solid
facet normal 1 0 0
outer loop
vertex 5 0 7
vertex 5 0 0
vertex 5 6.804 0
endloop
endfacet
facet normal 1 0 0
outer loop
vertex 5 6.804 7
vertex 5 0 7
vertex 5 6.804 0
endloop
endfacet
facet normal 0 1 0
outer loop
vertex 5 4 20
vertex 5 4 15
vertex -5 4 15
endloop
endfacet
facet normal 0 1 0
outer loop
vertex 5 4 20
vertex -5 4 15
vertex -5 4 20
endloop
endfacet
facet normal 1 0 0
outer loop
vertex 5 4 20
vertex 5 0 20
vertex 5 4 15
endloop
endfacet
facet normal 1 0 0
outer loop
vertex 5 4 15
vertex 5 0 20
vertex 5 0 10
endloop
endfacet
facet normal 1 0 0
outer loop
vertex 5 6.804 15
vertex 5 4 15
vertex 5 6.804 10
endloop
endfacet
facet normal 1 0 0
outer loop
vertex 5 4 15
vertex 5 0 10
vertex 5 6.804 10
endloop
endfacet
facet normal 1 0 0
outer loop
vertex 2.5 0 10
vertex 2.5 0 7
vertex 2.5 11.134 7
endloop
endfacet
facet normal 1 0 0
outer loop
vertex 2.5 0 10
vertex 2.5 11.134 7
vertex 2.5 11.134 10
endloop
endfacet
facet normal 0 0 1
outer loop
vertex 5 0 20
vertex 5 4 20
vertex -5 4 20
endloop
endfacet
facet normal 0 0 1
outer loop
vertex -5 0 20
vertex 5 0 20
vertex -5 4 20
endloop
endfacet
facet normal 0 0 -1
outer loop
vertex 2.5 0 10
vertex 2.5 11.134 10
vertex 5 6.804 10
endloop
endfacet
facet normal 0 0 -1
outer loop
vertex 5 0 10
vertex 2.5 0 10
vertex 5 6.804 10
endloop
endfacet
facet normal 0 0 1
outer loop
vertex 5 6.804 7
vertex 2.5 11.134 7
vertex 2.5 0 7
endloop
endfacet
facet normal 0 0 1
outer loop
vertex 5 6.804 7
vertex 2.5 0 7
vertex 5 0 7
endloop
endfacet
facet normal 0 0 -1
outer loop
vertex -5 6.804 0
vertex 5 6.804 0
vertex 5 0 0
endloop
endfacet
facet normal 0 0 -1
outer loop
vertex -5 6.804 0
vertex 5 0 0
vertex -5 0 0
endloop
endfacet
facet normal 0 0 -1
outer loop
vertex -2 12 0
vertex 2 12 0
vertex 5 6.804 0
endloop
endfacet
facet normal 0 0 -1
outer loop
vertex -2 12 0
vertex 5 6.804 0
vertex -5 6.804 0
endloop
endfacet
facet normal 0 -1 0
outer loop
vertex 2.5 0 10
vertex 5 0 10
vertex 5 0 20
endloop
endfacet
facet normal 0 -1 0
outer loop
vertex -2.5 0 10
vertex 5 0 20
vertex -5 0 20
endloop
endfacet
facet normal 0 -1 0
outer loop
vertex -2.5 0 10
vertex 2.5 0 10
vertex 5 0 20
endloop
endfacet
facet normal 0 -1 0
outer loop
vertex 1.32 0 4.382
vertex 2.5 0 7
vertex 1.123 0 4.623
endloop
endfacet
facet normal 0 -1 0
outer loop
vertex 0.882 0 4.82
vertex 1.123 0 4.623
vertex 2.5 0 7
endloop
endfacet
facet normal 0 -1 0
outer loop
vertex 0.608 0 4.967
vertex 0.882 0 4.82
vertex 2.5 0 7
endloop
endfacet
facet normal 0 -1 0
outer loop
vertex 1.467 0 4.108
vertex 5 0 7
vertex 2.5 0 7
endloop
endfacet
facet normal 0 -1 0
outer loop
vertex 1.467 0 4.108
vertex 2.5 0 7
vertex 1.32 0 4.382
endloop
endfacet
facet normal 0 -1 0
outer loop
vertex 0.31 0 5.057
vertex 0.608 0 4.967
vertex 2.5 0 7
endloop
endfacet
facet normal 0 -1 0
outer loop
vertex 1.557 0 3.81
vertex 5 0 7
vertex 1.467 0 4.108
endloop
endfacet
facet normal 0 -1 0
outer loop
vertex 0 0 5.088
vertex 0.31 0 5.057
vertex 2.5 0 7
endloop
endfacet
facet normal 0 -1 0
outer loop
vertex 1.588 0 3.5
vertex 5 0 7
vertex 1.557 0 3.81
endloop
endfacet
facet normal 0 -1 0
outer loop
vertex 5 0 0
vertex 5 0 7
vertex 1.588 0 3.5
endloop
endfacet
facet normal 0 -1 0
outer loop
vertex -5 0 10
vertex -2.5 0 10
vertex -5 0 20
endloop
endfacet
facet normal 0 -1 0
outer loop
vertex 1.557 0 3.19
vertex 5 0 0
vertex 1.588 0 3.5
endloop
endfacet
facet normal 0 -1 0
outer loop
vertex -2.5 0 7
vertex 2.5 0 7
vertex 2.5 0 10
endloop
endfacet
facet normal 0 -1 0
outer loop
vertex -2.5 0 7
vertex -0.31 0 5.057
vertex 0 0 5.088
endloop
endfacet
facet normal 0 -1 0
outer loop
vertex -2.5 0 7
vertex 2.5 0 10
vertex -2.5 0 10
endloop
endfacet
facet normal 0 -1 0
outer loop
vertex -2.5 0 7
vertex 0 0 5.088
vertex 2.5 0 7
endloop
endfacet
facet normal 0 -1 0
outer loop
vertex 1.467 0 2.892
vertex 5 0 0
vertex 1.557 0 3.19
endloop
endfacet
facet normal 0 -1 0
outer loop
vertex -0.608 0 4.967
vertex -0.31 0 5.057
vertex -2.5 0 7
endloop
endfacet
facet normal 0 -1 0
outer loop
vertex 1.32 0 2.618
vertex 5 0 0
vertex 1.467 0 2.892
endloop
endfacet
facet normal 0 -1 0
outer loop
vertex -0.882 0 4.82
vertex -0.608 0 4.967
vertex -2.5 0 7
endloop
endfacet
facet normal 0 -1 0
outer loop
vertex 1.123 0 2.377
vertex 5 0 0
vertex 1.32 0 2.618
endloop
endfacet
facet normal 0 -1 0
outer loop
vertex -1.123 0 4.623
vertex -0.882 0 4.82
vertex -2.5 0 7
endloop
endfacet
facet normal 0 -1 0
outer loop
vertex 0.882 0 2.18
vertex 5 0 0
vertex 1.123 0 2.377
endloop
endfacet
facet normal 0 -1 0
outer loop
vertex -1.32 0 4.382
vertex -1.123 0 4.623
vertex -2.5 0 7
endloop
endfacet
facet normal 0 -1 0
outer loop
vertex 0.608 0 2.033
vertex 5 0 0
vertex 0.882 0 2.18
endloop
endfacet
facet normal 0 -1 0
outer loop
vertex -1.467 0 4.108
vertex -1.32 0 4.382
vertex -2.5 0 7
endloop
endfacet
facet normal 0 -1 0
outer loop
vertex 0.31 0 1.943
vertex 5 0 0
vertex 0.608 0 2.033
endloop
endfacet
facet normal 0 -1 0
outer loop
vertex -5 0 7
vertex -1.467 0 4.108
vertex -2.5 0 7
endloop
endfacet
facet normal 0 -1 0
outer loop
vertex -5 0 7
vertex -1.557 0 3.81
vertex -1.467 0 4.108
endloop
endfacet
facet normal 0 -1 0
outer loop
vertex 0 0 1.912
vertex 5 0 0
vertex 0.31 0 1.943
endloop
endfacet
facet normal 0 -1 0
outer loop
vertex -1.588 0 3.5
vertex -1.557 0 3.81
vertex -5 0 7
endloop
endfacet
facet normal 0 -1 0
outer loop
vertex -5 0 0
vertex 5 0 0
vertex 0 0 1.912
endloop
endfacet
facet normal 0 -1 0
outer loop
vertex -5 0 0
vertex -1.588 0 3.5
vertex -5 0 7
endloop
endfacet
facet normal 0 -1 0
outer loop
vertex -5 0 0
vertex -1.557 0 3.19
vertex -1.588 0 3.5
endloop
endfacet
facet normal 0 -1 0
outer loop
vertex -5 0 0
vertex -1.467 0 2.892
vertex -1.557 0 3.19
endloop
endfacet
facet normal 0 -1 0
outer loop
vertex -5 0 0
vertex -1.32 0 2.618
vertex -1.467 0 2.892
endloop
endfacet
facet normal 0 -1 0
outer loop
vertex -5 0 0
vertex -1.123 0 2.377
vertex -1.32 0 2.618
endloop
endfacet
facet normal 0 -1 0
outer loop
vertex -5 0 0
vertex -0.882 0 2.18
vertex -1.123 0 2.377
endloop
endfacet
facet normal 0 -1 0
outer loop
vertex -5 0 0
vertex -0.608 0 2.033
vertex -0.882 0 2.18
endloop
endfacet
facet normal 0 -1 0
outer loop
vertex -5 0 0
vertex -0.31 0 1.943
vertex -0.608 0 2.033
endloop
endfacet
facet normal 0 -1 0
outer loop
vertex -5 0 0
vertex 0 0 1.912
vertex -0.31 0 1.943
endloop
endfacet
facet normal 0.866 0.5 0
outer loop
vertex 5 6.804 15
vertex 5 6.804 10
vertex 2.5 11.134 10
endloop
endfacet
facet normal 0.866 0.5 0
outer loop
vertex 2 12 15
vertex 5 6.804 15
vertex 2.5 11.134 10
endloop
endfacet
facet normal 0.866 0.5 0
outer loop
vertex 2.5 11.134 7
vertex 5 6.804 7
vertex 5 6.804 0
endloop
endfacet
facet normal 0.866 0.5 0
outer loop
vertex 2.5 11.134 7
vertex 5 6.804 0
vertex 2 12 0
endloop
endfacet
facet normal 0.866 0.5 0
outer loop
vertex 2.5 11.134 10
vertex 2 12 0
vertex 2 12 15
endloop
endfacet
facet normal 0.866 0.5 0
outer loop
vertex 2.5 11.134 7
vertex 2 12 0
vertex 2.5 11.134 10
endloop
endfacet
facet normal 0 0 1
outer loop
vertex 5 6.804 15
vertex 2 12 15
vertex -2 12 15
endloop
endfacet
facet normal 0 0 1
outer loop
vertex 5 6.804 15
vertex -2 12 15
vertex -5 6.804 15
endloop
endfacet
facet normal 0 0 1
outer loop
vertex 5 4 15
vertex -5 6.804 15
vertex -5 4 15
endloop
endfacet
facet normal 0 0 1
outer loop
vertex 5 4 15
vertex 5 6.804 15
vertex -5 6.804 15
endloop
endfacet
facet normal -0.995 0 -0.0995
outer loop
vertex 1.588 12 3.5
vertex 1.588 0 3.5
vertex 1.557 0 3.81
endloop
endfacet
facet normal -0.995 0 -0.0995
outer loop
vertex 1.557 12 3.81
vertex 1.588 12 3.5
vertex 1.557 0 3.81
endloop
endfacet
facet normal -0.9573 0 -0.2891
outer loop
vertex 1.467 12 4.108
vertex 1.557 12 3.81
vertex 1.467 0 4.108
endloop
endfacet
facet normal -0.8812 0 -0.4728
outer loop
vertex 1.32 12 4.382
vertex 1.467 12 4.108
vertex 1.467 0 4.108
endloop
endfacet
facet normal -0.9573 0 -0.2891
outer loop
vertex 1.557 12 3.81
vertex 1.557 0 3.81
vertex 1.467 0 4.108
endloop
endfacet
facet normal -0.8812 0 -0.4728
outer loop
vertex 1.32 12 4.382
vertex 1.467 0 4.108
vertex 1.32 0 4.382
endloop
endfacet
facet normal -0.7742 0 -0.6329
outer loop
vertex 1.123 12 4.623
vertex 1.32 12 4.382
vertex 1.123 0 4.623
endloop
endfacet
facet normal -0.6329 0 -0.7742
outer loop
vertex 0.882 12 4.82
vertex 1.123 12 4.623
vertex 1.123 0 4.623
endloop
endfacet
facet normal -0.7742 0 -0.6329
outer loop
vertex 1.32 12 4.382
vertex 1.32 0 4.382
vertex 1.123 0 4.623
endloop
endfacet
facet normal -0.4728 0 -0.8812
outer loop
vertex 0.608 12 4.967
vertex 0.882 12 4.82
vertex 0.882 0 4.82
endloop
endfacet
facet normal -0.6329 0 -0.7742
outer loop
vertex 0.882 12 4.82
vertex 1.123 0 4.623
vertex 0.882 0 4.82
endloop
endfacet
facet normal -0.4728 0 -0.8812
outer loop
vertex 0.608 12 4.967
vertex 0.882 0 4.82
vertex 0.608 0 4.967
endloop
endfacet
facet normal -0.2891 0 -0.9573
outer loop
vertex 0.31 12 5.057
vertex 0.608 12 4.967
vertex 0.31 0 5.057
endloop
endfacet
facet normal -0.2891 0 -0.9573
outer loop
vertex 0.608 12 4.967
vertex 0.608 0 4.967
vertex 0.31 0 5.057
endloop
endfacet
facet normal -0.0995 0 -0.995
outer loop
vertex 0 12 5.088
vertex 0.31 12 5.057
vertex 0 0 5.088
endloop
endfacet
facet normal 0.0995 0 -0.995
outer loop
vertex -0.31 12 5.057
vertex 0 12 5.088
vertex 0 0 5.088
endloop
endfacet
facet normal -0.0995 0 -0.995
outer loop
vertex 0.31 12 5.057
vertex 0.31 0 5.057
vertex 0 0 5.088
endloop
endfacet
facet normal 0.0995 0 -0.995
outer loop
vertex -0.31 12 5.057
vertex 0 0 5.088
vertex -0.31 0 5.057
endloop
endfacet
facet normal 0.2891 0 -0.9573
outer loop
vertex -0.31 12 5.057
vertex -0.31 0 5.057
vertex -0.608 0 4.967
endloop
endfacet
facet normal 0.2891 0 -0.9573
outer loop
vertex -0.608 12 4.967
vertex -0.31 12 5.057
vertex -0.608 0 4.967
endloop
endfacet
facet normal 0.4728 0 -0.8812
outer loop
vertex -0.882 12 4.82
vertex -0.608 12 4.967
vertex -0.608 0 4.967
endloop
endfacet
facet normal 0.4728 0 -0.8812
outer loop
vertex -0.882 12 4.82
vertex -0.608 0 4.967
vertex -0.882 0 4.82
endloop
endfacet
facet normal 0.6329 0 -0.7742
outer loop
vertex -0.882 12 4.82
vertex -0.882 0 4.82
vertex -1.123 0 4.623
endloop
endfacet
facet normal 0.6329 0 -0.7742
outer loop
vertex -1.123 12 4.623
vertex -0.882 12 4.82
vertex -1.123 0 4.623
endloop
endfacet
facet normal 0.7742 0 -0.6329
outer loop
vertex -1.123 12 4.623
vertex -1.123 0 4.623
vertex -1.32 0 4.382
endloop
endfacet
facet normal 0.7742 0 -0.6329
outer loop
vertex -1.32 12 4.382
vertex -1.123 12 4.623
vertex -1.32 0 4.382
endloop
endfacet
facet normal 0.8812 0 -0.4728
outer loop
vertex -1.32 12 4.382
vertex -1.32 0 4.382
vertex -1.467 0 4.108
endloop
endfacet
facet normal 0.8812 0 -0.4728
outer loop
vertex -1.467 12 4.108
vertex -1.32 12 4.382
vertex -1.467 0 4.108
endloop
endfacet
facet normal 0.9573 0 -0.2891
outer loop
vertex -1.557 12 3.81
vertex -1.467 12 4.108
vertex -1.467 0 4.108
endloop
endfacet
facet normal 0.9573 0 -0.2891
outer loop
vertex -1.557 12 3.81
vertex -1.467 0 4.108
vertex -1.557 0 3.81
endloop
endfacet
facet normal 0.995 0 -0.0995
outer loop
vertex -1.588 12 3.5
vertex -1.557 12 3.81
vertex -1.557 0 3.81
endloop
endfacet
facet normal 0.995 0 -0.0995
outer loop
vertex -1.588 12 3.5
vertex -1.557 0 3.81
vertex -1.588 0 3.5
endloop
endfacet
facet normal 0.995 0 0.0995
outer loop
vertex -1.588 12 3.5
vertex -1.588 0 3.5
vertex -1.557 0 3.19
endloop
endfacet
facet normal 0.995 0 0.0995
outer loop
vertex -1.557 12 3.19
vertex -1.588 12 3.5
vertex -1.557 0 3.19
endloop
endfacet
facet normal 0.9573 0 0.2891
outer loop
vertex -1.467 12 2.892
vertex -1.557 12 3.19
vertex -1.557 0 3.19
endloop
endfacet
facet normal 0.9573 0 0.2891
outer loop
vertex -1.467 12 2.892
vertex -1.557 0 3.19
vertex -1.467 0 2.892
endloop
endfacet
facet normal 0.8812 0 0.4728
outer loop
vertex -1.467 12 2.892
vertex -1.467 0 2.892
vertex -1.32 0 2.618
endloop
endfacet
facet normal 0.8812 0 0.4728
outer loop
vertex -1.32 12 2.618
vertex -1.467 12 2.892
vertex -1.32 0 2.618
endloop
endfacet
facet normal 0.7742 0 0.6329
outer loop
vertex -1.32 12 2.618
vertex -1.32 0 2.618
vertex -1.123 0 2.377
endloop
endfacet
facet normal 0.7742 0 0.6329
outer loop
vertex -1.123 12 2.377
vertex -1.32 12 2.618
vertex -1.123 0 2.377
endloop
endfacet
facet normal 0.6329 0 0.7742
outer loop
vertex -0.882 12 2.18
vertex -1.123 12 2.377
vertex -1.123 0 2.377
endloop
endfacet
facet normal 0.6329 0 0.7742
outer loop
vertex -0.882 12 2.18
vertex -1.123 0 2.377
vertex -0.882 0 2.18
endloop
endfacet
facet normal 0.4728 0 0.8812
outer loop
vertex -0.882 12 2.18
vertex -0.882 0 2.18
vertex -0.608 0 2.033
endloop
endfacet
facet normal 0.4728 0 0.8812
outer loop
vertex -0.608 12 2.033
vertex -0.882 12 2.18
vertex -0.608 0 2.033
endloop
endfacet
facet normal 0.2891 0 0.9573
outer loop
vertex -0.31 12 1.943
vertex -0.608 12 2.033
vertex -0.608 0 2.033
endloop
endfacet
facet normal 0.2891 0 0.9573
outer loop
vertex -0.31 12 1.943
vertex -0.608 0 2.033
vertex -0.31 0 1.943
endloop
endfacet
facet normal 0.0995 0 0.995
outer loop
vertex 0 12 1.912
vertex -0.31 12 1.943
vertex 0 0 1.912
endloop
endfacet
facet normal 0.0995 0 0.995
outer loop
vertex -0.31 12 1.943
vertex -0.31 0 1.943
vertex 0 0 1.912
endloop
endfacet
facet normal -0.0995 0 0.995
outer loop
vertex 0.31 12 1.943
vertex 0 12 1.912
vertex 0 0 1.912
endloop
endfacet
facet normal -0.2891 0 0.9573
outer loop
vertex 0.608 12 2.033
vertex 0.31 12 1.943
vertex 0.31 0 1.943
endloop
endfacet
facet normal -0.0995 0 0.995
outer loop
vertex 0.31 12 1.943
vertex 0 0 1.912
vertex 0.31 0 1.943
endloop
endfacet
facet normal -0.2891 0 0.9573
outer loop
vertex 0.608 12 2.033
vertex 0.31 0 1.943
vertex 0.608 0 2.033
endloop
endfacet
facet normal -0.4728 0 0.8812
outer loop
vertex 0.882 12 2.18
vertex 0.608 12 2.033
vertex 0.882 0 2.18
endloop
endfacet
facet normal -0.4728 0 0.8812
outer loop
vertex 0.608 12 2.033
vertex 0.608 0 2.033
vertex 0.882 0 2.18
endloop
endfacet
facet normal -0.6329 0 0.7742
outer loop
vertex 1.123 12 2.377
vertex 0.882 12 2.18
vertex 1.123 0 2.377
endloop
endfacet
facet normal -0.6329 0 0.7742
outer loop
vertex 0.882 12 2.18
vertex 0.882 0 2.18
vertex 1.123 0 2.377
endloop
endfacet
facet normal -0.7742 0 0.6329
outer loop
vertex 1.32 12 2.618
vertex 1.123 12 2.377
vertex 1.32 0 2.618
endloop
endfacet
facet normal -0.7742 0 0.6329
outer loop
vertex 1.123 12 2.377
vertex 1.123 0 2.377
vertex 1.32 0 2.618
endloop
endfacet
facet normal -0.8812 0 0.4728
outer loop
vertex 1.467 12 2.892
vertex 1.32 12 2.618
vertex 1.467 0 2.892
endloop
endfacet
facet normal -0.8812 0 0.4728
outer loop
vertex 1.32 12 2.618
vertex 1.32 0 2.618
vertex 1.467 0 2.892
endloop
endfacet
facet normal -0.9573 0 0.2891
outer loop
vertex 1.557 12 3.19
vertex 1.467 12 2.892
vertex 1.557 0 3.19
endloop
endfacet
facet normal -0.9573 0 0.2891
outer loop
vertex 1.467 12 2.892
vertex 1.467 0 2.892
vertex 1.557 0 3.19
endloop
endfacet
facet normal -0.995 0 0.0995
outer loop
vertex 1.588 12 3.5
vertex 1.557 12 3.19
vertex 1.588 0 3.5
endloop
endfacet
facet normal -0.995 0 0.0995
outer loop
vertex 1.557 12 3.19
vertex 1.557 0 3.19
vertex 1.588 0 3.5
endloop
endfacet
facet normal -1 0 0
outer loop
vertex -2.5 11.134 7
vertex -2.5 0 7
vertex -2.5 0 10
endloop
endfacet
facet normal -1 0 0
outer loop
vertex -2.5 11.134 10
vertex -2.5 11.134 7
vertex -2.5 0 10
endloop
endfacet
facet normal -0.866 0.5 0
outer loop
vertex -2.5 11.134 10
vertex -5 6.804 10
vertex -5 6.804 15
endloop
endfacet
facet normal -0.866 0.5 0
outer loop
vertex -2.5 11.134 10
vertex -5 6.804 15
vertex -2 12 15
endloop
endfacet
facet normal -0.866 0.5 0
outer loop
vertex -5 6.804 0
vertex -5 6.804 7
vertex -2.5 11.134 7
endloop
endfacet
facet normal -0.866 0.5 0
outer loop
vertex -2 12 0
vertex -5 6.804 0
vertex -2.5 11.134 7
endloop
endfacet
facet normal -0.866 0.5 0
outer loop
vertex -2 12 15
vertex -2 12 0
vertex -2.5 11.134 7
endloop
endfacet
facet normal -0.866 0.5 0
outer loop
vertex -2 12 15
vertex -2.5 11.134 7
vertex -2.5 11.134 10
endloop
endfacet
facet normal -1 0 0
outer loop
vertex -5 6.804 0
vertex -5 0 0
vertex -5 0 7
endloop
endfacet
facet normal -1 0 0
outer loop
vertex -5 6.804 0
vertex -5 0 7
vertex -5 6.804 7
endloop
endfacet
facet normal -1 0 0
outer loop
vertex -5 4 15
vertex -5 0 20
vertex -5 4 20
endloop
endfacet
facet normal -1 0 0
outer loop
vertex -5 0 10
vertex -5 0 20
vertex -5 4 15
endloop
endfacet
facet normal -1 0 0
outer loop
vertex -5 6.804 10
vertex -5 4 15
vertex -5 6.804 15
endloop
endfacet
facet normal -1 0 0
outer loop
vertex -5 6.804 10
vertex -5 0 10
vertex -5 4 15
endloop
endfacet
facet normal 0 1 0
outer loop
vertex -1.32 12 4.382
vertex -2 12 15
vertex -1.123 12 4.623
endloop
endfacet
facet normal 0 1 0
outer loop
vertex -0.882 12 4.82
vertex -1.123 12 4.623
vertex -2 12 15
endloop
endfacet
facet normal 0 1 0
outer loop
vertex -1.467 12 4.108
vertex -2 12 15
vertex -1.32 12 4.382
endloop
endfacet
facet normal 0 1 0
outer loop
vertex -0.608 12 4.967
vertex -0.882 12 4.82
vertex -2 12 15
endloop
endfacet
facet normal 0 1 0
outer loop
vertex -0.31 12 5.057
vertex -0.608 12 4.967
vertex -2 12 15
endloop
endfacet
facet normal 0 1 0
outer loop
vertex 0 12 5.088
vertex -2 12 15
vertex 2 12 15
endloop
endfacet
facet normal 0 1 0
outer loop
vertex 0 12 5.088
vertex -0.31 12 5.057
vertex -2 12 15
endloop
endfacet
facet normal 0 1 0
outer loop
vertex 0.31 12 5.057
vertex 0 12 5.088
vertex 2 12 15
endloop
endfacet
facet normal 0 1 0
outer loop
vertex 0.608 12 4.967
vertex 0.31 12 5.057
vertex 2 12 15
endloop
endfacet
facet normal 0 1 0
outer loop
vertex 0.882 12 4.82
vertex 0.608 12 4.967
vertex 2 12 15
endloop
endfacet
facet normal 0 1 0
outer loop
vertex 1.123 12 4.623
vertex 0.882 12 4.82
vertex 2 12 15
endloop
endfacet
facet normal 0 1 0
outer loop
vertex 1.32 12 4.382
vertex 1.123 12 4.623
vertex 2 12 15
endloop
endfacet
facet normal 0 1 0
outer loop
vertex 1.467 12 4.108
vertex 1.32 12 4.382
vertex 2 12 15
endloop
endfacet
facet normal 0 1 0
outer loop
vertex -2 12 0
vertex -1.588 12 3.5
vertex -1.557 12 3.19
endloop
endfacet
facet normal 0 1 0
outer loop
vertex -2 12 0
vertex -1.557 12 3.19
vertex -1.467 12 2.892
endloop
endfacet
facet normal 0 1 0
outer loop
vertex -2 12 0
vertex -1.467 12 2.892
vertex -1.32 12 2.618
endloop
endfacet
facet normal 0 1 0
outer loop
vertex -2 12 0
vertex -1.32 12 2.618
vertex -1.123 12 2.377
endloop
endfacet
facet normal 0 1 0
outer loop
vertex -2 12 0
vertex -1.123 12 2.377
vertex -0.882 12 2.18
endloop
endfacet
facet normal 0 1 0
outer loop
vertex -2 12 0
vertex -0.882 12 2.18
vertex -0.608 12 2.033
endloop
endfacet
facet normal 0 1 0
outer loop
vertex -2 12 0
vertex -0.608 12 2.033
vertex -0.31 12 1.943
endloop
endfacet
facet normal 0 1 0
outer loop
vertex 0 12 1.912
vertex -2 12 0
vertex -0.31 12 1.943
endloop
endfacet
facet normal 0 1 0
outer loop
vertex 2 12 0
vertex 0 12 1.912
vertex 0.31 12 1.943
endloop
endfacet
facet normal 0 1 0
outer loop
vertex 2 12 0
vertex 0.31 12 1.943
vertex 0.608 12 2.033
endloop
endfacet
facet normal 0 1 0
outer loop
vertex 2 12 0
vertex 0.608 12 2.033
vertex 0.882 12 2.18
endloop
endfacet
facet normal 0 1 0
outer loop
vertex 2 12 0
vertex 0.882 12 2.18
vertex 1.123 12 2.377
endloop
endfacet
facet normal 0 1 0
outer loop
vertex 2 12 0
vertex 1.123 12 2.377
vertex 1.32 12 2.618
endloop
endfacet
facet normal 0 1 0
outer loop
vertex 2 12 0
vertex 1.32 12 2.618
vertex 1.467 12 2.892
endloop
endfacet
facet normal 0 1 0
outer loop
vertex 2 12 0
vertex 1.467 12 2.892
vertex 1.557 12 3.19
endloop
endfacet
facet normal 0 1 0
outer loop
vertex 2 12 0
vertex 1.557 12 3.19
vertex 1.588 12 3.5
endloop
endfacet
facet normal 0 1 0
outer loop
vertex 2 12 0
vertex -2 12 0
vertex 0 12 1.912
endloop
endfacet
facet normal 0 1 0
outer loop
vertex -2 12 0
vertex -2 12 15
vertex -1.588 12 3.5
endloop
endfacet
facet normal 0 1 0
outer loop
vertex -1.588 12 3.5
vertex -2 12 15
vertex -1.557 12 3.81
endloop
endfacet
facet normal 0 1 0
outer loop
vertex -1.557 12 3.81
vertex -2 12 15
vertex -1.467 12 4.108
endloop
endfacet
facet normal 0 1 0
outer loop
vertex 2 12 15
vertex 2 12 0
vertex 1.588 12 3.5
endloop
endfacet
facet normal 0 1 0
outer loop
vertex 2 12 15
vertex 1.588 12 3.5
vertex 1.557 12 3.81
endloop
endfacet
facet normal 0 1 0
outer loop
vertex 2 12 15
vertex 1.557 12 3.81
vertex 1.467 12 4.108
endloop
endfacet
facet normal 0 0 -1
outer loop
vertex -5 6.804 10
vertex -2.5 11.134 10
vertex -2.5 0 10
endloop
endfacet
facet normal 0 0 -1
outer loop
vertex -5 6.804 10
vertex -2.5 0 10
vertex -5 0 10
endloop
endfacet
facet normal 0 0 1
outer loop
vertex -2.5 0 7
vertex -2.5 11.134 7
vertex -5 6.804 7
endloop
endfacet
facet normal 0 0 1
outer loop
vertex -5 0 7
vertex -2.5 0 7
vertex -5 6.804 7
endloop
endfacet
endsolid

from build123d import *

# Parameters (mm, degrees)
F1_DEPTH = 20
F2_W     = 8
F2_H     = 5
F3_DEPTH = 25.4
F4_W     = 2.5
F4_H     = 3
F5_DEPTH = 38.1
F7_R     = 1.5875
F8_DEPTH = 25.4


with BuildPart() as f1:
    # F0 (on Top) → F1 (new body)
    with BuildSketch(Plane.XY):
        Polygon((0, 12), (0, 0), (5, 0), (5, 6.803848), (2, 12), align=None)
    extrude(amount=F1_DEPTH)

    # F2 (on face) → F3 (cut)
    with BuildSketch(Plane(origin=(0, 0, 0), x_dir=(0, -1, 0), z_dir=(-1, 0, 0))):
        with Locations((-8, 17.5)):
            Rectangle(F2_W, F2_H)
    extrude(amount=-F3_DEPTH, mode=Mode.SUBTRACT)

    # F4 (on face) → F5 (cut)
    with BuildSketch(Plane.XZ):
        with Locations((3.75, 8.5)):
            Rectangle(F4_W, F4_H)
    extrude(amount=-F5_DEPTH, mode=Mode.SUBTRACT)

    # F6: F1 across face


with BuildPart() as f1_1:
    add(f1.part)
    add(f1.part.mirror(Plane(origin=(0, 5.6, 8.5), x_dir=(0, -1, 0), z_dir=(-1, 0, 0))))

    # F7 (on face) → F8 (cut)
    with BuildSketch(Plane.XZ):
        with Locations((0, 3.5)):
            Circle(F7_R)
    extrude(amount=-F8_DEPTH, mode=Mode.SUBTRACT)


solid = f1_1.part
